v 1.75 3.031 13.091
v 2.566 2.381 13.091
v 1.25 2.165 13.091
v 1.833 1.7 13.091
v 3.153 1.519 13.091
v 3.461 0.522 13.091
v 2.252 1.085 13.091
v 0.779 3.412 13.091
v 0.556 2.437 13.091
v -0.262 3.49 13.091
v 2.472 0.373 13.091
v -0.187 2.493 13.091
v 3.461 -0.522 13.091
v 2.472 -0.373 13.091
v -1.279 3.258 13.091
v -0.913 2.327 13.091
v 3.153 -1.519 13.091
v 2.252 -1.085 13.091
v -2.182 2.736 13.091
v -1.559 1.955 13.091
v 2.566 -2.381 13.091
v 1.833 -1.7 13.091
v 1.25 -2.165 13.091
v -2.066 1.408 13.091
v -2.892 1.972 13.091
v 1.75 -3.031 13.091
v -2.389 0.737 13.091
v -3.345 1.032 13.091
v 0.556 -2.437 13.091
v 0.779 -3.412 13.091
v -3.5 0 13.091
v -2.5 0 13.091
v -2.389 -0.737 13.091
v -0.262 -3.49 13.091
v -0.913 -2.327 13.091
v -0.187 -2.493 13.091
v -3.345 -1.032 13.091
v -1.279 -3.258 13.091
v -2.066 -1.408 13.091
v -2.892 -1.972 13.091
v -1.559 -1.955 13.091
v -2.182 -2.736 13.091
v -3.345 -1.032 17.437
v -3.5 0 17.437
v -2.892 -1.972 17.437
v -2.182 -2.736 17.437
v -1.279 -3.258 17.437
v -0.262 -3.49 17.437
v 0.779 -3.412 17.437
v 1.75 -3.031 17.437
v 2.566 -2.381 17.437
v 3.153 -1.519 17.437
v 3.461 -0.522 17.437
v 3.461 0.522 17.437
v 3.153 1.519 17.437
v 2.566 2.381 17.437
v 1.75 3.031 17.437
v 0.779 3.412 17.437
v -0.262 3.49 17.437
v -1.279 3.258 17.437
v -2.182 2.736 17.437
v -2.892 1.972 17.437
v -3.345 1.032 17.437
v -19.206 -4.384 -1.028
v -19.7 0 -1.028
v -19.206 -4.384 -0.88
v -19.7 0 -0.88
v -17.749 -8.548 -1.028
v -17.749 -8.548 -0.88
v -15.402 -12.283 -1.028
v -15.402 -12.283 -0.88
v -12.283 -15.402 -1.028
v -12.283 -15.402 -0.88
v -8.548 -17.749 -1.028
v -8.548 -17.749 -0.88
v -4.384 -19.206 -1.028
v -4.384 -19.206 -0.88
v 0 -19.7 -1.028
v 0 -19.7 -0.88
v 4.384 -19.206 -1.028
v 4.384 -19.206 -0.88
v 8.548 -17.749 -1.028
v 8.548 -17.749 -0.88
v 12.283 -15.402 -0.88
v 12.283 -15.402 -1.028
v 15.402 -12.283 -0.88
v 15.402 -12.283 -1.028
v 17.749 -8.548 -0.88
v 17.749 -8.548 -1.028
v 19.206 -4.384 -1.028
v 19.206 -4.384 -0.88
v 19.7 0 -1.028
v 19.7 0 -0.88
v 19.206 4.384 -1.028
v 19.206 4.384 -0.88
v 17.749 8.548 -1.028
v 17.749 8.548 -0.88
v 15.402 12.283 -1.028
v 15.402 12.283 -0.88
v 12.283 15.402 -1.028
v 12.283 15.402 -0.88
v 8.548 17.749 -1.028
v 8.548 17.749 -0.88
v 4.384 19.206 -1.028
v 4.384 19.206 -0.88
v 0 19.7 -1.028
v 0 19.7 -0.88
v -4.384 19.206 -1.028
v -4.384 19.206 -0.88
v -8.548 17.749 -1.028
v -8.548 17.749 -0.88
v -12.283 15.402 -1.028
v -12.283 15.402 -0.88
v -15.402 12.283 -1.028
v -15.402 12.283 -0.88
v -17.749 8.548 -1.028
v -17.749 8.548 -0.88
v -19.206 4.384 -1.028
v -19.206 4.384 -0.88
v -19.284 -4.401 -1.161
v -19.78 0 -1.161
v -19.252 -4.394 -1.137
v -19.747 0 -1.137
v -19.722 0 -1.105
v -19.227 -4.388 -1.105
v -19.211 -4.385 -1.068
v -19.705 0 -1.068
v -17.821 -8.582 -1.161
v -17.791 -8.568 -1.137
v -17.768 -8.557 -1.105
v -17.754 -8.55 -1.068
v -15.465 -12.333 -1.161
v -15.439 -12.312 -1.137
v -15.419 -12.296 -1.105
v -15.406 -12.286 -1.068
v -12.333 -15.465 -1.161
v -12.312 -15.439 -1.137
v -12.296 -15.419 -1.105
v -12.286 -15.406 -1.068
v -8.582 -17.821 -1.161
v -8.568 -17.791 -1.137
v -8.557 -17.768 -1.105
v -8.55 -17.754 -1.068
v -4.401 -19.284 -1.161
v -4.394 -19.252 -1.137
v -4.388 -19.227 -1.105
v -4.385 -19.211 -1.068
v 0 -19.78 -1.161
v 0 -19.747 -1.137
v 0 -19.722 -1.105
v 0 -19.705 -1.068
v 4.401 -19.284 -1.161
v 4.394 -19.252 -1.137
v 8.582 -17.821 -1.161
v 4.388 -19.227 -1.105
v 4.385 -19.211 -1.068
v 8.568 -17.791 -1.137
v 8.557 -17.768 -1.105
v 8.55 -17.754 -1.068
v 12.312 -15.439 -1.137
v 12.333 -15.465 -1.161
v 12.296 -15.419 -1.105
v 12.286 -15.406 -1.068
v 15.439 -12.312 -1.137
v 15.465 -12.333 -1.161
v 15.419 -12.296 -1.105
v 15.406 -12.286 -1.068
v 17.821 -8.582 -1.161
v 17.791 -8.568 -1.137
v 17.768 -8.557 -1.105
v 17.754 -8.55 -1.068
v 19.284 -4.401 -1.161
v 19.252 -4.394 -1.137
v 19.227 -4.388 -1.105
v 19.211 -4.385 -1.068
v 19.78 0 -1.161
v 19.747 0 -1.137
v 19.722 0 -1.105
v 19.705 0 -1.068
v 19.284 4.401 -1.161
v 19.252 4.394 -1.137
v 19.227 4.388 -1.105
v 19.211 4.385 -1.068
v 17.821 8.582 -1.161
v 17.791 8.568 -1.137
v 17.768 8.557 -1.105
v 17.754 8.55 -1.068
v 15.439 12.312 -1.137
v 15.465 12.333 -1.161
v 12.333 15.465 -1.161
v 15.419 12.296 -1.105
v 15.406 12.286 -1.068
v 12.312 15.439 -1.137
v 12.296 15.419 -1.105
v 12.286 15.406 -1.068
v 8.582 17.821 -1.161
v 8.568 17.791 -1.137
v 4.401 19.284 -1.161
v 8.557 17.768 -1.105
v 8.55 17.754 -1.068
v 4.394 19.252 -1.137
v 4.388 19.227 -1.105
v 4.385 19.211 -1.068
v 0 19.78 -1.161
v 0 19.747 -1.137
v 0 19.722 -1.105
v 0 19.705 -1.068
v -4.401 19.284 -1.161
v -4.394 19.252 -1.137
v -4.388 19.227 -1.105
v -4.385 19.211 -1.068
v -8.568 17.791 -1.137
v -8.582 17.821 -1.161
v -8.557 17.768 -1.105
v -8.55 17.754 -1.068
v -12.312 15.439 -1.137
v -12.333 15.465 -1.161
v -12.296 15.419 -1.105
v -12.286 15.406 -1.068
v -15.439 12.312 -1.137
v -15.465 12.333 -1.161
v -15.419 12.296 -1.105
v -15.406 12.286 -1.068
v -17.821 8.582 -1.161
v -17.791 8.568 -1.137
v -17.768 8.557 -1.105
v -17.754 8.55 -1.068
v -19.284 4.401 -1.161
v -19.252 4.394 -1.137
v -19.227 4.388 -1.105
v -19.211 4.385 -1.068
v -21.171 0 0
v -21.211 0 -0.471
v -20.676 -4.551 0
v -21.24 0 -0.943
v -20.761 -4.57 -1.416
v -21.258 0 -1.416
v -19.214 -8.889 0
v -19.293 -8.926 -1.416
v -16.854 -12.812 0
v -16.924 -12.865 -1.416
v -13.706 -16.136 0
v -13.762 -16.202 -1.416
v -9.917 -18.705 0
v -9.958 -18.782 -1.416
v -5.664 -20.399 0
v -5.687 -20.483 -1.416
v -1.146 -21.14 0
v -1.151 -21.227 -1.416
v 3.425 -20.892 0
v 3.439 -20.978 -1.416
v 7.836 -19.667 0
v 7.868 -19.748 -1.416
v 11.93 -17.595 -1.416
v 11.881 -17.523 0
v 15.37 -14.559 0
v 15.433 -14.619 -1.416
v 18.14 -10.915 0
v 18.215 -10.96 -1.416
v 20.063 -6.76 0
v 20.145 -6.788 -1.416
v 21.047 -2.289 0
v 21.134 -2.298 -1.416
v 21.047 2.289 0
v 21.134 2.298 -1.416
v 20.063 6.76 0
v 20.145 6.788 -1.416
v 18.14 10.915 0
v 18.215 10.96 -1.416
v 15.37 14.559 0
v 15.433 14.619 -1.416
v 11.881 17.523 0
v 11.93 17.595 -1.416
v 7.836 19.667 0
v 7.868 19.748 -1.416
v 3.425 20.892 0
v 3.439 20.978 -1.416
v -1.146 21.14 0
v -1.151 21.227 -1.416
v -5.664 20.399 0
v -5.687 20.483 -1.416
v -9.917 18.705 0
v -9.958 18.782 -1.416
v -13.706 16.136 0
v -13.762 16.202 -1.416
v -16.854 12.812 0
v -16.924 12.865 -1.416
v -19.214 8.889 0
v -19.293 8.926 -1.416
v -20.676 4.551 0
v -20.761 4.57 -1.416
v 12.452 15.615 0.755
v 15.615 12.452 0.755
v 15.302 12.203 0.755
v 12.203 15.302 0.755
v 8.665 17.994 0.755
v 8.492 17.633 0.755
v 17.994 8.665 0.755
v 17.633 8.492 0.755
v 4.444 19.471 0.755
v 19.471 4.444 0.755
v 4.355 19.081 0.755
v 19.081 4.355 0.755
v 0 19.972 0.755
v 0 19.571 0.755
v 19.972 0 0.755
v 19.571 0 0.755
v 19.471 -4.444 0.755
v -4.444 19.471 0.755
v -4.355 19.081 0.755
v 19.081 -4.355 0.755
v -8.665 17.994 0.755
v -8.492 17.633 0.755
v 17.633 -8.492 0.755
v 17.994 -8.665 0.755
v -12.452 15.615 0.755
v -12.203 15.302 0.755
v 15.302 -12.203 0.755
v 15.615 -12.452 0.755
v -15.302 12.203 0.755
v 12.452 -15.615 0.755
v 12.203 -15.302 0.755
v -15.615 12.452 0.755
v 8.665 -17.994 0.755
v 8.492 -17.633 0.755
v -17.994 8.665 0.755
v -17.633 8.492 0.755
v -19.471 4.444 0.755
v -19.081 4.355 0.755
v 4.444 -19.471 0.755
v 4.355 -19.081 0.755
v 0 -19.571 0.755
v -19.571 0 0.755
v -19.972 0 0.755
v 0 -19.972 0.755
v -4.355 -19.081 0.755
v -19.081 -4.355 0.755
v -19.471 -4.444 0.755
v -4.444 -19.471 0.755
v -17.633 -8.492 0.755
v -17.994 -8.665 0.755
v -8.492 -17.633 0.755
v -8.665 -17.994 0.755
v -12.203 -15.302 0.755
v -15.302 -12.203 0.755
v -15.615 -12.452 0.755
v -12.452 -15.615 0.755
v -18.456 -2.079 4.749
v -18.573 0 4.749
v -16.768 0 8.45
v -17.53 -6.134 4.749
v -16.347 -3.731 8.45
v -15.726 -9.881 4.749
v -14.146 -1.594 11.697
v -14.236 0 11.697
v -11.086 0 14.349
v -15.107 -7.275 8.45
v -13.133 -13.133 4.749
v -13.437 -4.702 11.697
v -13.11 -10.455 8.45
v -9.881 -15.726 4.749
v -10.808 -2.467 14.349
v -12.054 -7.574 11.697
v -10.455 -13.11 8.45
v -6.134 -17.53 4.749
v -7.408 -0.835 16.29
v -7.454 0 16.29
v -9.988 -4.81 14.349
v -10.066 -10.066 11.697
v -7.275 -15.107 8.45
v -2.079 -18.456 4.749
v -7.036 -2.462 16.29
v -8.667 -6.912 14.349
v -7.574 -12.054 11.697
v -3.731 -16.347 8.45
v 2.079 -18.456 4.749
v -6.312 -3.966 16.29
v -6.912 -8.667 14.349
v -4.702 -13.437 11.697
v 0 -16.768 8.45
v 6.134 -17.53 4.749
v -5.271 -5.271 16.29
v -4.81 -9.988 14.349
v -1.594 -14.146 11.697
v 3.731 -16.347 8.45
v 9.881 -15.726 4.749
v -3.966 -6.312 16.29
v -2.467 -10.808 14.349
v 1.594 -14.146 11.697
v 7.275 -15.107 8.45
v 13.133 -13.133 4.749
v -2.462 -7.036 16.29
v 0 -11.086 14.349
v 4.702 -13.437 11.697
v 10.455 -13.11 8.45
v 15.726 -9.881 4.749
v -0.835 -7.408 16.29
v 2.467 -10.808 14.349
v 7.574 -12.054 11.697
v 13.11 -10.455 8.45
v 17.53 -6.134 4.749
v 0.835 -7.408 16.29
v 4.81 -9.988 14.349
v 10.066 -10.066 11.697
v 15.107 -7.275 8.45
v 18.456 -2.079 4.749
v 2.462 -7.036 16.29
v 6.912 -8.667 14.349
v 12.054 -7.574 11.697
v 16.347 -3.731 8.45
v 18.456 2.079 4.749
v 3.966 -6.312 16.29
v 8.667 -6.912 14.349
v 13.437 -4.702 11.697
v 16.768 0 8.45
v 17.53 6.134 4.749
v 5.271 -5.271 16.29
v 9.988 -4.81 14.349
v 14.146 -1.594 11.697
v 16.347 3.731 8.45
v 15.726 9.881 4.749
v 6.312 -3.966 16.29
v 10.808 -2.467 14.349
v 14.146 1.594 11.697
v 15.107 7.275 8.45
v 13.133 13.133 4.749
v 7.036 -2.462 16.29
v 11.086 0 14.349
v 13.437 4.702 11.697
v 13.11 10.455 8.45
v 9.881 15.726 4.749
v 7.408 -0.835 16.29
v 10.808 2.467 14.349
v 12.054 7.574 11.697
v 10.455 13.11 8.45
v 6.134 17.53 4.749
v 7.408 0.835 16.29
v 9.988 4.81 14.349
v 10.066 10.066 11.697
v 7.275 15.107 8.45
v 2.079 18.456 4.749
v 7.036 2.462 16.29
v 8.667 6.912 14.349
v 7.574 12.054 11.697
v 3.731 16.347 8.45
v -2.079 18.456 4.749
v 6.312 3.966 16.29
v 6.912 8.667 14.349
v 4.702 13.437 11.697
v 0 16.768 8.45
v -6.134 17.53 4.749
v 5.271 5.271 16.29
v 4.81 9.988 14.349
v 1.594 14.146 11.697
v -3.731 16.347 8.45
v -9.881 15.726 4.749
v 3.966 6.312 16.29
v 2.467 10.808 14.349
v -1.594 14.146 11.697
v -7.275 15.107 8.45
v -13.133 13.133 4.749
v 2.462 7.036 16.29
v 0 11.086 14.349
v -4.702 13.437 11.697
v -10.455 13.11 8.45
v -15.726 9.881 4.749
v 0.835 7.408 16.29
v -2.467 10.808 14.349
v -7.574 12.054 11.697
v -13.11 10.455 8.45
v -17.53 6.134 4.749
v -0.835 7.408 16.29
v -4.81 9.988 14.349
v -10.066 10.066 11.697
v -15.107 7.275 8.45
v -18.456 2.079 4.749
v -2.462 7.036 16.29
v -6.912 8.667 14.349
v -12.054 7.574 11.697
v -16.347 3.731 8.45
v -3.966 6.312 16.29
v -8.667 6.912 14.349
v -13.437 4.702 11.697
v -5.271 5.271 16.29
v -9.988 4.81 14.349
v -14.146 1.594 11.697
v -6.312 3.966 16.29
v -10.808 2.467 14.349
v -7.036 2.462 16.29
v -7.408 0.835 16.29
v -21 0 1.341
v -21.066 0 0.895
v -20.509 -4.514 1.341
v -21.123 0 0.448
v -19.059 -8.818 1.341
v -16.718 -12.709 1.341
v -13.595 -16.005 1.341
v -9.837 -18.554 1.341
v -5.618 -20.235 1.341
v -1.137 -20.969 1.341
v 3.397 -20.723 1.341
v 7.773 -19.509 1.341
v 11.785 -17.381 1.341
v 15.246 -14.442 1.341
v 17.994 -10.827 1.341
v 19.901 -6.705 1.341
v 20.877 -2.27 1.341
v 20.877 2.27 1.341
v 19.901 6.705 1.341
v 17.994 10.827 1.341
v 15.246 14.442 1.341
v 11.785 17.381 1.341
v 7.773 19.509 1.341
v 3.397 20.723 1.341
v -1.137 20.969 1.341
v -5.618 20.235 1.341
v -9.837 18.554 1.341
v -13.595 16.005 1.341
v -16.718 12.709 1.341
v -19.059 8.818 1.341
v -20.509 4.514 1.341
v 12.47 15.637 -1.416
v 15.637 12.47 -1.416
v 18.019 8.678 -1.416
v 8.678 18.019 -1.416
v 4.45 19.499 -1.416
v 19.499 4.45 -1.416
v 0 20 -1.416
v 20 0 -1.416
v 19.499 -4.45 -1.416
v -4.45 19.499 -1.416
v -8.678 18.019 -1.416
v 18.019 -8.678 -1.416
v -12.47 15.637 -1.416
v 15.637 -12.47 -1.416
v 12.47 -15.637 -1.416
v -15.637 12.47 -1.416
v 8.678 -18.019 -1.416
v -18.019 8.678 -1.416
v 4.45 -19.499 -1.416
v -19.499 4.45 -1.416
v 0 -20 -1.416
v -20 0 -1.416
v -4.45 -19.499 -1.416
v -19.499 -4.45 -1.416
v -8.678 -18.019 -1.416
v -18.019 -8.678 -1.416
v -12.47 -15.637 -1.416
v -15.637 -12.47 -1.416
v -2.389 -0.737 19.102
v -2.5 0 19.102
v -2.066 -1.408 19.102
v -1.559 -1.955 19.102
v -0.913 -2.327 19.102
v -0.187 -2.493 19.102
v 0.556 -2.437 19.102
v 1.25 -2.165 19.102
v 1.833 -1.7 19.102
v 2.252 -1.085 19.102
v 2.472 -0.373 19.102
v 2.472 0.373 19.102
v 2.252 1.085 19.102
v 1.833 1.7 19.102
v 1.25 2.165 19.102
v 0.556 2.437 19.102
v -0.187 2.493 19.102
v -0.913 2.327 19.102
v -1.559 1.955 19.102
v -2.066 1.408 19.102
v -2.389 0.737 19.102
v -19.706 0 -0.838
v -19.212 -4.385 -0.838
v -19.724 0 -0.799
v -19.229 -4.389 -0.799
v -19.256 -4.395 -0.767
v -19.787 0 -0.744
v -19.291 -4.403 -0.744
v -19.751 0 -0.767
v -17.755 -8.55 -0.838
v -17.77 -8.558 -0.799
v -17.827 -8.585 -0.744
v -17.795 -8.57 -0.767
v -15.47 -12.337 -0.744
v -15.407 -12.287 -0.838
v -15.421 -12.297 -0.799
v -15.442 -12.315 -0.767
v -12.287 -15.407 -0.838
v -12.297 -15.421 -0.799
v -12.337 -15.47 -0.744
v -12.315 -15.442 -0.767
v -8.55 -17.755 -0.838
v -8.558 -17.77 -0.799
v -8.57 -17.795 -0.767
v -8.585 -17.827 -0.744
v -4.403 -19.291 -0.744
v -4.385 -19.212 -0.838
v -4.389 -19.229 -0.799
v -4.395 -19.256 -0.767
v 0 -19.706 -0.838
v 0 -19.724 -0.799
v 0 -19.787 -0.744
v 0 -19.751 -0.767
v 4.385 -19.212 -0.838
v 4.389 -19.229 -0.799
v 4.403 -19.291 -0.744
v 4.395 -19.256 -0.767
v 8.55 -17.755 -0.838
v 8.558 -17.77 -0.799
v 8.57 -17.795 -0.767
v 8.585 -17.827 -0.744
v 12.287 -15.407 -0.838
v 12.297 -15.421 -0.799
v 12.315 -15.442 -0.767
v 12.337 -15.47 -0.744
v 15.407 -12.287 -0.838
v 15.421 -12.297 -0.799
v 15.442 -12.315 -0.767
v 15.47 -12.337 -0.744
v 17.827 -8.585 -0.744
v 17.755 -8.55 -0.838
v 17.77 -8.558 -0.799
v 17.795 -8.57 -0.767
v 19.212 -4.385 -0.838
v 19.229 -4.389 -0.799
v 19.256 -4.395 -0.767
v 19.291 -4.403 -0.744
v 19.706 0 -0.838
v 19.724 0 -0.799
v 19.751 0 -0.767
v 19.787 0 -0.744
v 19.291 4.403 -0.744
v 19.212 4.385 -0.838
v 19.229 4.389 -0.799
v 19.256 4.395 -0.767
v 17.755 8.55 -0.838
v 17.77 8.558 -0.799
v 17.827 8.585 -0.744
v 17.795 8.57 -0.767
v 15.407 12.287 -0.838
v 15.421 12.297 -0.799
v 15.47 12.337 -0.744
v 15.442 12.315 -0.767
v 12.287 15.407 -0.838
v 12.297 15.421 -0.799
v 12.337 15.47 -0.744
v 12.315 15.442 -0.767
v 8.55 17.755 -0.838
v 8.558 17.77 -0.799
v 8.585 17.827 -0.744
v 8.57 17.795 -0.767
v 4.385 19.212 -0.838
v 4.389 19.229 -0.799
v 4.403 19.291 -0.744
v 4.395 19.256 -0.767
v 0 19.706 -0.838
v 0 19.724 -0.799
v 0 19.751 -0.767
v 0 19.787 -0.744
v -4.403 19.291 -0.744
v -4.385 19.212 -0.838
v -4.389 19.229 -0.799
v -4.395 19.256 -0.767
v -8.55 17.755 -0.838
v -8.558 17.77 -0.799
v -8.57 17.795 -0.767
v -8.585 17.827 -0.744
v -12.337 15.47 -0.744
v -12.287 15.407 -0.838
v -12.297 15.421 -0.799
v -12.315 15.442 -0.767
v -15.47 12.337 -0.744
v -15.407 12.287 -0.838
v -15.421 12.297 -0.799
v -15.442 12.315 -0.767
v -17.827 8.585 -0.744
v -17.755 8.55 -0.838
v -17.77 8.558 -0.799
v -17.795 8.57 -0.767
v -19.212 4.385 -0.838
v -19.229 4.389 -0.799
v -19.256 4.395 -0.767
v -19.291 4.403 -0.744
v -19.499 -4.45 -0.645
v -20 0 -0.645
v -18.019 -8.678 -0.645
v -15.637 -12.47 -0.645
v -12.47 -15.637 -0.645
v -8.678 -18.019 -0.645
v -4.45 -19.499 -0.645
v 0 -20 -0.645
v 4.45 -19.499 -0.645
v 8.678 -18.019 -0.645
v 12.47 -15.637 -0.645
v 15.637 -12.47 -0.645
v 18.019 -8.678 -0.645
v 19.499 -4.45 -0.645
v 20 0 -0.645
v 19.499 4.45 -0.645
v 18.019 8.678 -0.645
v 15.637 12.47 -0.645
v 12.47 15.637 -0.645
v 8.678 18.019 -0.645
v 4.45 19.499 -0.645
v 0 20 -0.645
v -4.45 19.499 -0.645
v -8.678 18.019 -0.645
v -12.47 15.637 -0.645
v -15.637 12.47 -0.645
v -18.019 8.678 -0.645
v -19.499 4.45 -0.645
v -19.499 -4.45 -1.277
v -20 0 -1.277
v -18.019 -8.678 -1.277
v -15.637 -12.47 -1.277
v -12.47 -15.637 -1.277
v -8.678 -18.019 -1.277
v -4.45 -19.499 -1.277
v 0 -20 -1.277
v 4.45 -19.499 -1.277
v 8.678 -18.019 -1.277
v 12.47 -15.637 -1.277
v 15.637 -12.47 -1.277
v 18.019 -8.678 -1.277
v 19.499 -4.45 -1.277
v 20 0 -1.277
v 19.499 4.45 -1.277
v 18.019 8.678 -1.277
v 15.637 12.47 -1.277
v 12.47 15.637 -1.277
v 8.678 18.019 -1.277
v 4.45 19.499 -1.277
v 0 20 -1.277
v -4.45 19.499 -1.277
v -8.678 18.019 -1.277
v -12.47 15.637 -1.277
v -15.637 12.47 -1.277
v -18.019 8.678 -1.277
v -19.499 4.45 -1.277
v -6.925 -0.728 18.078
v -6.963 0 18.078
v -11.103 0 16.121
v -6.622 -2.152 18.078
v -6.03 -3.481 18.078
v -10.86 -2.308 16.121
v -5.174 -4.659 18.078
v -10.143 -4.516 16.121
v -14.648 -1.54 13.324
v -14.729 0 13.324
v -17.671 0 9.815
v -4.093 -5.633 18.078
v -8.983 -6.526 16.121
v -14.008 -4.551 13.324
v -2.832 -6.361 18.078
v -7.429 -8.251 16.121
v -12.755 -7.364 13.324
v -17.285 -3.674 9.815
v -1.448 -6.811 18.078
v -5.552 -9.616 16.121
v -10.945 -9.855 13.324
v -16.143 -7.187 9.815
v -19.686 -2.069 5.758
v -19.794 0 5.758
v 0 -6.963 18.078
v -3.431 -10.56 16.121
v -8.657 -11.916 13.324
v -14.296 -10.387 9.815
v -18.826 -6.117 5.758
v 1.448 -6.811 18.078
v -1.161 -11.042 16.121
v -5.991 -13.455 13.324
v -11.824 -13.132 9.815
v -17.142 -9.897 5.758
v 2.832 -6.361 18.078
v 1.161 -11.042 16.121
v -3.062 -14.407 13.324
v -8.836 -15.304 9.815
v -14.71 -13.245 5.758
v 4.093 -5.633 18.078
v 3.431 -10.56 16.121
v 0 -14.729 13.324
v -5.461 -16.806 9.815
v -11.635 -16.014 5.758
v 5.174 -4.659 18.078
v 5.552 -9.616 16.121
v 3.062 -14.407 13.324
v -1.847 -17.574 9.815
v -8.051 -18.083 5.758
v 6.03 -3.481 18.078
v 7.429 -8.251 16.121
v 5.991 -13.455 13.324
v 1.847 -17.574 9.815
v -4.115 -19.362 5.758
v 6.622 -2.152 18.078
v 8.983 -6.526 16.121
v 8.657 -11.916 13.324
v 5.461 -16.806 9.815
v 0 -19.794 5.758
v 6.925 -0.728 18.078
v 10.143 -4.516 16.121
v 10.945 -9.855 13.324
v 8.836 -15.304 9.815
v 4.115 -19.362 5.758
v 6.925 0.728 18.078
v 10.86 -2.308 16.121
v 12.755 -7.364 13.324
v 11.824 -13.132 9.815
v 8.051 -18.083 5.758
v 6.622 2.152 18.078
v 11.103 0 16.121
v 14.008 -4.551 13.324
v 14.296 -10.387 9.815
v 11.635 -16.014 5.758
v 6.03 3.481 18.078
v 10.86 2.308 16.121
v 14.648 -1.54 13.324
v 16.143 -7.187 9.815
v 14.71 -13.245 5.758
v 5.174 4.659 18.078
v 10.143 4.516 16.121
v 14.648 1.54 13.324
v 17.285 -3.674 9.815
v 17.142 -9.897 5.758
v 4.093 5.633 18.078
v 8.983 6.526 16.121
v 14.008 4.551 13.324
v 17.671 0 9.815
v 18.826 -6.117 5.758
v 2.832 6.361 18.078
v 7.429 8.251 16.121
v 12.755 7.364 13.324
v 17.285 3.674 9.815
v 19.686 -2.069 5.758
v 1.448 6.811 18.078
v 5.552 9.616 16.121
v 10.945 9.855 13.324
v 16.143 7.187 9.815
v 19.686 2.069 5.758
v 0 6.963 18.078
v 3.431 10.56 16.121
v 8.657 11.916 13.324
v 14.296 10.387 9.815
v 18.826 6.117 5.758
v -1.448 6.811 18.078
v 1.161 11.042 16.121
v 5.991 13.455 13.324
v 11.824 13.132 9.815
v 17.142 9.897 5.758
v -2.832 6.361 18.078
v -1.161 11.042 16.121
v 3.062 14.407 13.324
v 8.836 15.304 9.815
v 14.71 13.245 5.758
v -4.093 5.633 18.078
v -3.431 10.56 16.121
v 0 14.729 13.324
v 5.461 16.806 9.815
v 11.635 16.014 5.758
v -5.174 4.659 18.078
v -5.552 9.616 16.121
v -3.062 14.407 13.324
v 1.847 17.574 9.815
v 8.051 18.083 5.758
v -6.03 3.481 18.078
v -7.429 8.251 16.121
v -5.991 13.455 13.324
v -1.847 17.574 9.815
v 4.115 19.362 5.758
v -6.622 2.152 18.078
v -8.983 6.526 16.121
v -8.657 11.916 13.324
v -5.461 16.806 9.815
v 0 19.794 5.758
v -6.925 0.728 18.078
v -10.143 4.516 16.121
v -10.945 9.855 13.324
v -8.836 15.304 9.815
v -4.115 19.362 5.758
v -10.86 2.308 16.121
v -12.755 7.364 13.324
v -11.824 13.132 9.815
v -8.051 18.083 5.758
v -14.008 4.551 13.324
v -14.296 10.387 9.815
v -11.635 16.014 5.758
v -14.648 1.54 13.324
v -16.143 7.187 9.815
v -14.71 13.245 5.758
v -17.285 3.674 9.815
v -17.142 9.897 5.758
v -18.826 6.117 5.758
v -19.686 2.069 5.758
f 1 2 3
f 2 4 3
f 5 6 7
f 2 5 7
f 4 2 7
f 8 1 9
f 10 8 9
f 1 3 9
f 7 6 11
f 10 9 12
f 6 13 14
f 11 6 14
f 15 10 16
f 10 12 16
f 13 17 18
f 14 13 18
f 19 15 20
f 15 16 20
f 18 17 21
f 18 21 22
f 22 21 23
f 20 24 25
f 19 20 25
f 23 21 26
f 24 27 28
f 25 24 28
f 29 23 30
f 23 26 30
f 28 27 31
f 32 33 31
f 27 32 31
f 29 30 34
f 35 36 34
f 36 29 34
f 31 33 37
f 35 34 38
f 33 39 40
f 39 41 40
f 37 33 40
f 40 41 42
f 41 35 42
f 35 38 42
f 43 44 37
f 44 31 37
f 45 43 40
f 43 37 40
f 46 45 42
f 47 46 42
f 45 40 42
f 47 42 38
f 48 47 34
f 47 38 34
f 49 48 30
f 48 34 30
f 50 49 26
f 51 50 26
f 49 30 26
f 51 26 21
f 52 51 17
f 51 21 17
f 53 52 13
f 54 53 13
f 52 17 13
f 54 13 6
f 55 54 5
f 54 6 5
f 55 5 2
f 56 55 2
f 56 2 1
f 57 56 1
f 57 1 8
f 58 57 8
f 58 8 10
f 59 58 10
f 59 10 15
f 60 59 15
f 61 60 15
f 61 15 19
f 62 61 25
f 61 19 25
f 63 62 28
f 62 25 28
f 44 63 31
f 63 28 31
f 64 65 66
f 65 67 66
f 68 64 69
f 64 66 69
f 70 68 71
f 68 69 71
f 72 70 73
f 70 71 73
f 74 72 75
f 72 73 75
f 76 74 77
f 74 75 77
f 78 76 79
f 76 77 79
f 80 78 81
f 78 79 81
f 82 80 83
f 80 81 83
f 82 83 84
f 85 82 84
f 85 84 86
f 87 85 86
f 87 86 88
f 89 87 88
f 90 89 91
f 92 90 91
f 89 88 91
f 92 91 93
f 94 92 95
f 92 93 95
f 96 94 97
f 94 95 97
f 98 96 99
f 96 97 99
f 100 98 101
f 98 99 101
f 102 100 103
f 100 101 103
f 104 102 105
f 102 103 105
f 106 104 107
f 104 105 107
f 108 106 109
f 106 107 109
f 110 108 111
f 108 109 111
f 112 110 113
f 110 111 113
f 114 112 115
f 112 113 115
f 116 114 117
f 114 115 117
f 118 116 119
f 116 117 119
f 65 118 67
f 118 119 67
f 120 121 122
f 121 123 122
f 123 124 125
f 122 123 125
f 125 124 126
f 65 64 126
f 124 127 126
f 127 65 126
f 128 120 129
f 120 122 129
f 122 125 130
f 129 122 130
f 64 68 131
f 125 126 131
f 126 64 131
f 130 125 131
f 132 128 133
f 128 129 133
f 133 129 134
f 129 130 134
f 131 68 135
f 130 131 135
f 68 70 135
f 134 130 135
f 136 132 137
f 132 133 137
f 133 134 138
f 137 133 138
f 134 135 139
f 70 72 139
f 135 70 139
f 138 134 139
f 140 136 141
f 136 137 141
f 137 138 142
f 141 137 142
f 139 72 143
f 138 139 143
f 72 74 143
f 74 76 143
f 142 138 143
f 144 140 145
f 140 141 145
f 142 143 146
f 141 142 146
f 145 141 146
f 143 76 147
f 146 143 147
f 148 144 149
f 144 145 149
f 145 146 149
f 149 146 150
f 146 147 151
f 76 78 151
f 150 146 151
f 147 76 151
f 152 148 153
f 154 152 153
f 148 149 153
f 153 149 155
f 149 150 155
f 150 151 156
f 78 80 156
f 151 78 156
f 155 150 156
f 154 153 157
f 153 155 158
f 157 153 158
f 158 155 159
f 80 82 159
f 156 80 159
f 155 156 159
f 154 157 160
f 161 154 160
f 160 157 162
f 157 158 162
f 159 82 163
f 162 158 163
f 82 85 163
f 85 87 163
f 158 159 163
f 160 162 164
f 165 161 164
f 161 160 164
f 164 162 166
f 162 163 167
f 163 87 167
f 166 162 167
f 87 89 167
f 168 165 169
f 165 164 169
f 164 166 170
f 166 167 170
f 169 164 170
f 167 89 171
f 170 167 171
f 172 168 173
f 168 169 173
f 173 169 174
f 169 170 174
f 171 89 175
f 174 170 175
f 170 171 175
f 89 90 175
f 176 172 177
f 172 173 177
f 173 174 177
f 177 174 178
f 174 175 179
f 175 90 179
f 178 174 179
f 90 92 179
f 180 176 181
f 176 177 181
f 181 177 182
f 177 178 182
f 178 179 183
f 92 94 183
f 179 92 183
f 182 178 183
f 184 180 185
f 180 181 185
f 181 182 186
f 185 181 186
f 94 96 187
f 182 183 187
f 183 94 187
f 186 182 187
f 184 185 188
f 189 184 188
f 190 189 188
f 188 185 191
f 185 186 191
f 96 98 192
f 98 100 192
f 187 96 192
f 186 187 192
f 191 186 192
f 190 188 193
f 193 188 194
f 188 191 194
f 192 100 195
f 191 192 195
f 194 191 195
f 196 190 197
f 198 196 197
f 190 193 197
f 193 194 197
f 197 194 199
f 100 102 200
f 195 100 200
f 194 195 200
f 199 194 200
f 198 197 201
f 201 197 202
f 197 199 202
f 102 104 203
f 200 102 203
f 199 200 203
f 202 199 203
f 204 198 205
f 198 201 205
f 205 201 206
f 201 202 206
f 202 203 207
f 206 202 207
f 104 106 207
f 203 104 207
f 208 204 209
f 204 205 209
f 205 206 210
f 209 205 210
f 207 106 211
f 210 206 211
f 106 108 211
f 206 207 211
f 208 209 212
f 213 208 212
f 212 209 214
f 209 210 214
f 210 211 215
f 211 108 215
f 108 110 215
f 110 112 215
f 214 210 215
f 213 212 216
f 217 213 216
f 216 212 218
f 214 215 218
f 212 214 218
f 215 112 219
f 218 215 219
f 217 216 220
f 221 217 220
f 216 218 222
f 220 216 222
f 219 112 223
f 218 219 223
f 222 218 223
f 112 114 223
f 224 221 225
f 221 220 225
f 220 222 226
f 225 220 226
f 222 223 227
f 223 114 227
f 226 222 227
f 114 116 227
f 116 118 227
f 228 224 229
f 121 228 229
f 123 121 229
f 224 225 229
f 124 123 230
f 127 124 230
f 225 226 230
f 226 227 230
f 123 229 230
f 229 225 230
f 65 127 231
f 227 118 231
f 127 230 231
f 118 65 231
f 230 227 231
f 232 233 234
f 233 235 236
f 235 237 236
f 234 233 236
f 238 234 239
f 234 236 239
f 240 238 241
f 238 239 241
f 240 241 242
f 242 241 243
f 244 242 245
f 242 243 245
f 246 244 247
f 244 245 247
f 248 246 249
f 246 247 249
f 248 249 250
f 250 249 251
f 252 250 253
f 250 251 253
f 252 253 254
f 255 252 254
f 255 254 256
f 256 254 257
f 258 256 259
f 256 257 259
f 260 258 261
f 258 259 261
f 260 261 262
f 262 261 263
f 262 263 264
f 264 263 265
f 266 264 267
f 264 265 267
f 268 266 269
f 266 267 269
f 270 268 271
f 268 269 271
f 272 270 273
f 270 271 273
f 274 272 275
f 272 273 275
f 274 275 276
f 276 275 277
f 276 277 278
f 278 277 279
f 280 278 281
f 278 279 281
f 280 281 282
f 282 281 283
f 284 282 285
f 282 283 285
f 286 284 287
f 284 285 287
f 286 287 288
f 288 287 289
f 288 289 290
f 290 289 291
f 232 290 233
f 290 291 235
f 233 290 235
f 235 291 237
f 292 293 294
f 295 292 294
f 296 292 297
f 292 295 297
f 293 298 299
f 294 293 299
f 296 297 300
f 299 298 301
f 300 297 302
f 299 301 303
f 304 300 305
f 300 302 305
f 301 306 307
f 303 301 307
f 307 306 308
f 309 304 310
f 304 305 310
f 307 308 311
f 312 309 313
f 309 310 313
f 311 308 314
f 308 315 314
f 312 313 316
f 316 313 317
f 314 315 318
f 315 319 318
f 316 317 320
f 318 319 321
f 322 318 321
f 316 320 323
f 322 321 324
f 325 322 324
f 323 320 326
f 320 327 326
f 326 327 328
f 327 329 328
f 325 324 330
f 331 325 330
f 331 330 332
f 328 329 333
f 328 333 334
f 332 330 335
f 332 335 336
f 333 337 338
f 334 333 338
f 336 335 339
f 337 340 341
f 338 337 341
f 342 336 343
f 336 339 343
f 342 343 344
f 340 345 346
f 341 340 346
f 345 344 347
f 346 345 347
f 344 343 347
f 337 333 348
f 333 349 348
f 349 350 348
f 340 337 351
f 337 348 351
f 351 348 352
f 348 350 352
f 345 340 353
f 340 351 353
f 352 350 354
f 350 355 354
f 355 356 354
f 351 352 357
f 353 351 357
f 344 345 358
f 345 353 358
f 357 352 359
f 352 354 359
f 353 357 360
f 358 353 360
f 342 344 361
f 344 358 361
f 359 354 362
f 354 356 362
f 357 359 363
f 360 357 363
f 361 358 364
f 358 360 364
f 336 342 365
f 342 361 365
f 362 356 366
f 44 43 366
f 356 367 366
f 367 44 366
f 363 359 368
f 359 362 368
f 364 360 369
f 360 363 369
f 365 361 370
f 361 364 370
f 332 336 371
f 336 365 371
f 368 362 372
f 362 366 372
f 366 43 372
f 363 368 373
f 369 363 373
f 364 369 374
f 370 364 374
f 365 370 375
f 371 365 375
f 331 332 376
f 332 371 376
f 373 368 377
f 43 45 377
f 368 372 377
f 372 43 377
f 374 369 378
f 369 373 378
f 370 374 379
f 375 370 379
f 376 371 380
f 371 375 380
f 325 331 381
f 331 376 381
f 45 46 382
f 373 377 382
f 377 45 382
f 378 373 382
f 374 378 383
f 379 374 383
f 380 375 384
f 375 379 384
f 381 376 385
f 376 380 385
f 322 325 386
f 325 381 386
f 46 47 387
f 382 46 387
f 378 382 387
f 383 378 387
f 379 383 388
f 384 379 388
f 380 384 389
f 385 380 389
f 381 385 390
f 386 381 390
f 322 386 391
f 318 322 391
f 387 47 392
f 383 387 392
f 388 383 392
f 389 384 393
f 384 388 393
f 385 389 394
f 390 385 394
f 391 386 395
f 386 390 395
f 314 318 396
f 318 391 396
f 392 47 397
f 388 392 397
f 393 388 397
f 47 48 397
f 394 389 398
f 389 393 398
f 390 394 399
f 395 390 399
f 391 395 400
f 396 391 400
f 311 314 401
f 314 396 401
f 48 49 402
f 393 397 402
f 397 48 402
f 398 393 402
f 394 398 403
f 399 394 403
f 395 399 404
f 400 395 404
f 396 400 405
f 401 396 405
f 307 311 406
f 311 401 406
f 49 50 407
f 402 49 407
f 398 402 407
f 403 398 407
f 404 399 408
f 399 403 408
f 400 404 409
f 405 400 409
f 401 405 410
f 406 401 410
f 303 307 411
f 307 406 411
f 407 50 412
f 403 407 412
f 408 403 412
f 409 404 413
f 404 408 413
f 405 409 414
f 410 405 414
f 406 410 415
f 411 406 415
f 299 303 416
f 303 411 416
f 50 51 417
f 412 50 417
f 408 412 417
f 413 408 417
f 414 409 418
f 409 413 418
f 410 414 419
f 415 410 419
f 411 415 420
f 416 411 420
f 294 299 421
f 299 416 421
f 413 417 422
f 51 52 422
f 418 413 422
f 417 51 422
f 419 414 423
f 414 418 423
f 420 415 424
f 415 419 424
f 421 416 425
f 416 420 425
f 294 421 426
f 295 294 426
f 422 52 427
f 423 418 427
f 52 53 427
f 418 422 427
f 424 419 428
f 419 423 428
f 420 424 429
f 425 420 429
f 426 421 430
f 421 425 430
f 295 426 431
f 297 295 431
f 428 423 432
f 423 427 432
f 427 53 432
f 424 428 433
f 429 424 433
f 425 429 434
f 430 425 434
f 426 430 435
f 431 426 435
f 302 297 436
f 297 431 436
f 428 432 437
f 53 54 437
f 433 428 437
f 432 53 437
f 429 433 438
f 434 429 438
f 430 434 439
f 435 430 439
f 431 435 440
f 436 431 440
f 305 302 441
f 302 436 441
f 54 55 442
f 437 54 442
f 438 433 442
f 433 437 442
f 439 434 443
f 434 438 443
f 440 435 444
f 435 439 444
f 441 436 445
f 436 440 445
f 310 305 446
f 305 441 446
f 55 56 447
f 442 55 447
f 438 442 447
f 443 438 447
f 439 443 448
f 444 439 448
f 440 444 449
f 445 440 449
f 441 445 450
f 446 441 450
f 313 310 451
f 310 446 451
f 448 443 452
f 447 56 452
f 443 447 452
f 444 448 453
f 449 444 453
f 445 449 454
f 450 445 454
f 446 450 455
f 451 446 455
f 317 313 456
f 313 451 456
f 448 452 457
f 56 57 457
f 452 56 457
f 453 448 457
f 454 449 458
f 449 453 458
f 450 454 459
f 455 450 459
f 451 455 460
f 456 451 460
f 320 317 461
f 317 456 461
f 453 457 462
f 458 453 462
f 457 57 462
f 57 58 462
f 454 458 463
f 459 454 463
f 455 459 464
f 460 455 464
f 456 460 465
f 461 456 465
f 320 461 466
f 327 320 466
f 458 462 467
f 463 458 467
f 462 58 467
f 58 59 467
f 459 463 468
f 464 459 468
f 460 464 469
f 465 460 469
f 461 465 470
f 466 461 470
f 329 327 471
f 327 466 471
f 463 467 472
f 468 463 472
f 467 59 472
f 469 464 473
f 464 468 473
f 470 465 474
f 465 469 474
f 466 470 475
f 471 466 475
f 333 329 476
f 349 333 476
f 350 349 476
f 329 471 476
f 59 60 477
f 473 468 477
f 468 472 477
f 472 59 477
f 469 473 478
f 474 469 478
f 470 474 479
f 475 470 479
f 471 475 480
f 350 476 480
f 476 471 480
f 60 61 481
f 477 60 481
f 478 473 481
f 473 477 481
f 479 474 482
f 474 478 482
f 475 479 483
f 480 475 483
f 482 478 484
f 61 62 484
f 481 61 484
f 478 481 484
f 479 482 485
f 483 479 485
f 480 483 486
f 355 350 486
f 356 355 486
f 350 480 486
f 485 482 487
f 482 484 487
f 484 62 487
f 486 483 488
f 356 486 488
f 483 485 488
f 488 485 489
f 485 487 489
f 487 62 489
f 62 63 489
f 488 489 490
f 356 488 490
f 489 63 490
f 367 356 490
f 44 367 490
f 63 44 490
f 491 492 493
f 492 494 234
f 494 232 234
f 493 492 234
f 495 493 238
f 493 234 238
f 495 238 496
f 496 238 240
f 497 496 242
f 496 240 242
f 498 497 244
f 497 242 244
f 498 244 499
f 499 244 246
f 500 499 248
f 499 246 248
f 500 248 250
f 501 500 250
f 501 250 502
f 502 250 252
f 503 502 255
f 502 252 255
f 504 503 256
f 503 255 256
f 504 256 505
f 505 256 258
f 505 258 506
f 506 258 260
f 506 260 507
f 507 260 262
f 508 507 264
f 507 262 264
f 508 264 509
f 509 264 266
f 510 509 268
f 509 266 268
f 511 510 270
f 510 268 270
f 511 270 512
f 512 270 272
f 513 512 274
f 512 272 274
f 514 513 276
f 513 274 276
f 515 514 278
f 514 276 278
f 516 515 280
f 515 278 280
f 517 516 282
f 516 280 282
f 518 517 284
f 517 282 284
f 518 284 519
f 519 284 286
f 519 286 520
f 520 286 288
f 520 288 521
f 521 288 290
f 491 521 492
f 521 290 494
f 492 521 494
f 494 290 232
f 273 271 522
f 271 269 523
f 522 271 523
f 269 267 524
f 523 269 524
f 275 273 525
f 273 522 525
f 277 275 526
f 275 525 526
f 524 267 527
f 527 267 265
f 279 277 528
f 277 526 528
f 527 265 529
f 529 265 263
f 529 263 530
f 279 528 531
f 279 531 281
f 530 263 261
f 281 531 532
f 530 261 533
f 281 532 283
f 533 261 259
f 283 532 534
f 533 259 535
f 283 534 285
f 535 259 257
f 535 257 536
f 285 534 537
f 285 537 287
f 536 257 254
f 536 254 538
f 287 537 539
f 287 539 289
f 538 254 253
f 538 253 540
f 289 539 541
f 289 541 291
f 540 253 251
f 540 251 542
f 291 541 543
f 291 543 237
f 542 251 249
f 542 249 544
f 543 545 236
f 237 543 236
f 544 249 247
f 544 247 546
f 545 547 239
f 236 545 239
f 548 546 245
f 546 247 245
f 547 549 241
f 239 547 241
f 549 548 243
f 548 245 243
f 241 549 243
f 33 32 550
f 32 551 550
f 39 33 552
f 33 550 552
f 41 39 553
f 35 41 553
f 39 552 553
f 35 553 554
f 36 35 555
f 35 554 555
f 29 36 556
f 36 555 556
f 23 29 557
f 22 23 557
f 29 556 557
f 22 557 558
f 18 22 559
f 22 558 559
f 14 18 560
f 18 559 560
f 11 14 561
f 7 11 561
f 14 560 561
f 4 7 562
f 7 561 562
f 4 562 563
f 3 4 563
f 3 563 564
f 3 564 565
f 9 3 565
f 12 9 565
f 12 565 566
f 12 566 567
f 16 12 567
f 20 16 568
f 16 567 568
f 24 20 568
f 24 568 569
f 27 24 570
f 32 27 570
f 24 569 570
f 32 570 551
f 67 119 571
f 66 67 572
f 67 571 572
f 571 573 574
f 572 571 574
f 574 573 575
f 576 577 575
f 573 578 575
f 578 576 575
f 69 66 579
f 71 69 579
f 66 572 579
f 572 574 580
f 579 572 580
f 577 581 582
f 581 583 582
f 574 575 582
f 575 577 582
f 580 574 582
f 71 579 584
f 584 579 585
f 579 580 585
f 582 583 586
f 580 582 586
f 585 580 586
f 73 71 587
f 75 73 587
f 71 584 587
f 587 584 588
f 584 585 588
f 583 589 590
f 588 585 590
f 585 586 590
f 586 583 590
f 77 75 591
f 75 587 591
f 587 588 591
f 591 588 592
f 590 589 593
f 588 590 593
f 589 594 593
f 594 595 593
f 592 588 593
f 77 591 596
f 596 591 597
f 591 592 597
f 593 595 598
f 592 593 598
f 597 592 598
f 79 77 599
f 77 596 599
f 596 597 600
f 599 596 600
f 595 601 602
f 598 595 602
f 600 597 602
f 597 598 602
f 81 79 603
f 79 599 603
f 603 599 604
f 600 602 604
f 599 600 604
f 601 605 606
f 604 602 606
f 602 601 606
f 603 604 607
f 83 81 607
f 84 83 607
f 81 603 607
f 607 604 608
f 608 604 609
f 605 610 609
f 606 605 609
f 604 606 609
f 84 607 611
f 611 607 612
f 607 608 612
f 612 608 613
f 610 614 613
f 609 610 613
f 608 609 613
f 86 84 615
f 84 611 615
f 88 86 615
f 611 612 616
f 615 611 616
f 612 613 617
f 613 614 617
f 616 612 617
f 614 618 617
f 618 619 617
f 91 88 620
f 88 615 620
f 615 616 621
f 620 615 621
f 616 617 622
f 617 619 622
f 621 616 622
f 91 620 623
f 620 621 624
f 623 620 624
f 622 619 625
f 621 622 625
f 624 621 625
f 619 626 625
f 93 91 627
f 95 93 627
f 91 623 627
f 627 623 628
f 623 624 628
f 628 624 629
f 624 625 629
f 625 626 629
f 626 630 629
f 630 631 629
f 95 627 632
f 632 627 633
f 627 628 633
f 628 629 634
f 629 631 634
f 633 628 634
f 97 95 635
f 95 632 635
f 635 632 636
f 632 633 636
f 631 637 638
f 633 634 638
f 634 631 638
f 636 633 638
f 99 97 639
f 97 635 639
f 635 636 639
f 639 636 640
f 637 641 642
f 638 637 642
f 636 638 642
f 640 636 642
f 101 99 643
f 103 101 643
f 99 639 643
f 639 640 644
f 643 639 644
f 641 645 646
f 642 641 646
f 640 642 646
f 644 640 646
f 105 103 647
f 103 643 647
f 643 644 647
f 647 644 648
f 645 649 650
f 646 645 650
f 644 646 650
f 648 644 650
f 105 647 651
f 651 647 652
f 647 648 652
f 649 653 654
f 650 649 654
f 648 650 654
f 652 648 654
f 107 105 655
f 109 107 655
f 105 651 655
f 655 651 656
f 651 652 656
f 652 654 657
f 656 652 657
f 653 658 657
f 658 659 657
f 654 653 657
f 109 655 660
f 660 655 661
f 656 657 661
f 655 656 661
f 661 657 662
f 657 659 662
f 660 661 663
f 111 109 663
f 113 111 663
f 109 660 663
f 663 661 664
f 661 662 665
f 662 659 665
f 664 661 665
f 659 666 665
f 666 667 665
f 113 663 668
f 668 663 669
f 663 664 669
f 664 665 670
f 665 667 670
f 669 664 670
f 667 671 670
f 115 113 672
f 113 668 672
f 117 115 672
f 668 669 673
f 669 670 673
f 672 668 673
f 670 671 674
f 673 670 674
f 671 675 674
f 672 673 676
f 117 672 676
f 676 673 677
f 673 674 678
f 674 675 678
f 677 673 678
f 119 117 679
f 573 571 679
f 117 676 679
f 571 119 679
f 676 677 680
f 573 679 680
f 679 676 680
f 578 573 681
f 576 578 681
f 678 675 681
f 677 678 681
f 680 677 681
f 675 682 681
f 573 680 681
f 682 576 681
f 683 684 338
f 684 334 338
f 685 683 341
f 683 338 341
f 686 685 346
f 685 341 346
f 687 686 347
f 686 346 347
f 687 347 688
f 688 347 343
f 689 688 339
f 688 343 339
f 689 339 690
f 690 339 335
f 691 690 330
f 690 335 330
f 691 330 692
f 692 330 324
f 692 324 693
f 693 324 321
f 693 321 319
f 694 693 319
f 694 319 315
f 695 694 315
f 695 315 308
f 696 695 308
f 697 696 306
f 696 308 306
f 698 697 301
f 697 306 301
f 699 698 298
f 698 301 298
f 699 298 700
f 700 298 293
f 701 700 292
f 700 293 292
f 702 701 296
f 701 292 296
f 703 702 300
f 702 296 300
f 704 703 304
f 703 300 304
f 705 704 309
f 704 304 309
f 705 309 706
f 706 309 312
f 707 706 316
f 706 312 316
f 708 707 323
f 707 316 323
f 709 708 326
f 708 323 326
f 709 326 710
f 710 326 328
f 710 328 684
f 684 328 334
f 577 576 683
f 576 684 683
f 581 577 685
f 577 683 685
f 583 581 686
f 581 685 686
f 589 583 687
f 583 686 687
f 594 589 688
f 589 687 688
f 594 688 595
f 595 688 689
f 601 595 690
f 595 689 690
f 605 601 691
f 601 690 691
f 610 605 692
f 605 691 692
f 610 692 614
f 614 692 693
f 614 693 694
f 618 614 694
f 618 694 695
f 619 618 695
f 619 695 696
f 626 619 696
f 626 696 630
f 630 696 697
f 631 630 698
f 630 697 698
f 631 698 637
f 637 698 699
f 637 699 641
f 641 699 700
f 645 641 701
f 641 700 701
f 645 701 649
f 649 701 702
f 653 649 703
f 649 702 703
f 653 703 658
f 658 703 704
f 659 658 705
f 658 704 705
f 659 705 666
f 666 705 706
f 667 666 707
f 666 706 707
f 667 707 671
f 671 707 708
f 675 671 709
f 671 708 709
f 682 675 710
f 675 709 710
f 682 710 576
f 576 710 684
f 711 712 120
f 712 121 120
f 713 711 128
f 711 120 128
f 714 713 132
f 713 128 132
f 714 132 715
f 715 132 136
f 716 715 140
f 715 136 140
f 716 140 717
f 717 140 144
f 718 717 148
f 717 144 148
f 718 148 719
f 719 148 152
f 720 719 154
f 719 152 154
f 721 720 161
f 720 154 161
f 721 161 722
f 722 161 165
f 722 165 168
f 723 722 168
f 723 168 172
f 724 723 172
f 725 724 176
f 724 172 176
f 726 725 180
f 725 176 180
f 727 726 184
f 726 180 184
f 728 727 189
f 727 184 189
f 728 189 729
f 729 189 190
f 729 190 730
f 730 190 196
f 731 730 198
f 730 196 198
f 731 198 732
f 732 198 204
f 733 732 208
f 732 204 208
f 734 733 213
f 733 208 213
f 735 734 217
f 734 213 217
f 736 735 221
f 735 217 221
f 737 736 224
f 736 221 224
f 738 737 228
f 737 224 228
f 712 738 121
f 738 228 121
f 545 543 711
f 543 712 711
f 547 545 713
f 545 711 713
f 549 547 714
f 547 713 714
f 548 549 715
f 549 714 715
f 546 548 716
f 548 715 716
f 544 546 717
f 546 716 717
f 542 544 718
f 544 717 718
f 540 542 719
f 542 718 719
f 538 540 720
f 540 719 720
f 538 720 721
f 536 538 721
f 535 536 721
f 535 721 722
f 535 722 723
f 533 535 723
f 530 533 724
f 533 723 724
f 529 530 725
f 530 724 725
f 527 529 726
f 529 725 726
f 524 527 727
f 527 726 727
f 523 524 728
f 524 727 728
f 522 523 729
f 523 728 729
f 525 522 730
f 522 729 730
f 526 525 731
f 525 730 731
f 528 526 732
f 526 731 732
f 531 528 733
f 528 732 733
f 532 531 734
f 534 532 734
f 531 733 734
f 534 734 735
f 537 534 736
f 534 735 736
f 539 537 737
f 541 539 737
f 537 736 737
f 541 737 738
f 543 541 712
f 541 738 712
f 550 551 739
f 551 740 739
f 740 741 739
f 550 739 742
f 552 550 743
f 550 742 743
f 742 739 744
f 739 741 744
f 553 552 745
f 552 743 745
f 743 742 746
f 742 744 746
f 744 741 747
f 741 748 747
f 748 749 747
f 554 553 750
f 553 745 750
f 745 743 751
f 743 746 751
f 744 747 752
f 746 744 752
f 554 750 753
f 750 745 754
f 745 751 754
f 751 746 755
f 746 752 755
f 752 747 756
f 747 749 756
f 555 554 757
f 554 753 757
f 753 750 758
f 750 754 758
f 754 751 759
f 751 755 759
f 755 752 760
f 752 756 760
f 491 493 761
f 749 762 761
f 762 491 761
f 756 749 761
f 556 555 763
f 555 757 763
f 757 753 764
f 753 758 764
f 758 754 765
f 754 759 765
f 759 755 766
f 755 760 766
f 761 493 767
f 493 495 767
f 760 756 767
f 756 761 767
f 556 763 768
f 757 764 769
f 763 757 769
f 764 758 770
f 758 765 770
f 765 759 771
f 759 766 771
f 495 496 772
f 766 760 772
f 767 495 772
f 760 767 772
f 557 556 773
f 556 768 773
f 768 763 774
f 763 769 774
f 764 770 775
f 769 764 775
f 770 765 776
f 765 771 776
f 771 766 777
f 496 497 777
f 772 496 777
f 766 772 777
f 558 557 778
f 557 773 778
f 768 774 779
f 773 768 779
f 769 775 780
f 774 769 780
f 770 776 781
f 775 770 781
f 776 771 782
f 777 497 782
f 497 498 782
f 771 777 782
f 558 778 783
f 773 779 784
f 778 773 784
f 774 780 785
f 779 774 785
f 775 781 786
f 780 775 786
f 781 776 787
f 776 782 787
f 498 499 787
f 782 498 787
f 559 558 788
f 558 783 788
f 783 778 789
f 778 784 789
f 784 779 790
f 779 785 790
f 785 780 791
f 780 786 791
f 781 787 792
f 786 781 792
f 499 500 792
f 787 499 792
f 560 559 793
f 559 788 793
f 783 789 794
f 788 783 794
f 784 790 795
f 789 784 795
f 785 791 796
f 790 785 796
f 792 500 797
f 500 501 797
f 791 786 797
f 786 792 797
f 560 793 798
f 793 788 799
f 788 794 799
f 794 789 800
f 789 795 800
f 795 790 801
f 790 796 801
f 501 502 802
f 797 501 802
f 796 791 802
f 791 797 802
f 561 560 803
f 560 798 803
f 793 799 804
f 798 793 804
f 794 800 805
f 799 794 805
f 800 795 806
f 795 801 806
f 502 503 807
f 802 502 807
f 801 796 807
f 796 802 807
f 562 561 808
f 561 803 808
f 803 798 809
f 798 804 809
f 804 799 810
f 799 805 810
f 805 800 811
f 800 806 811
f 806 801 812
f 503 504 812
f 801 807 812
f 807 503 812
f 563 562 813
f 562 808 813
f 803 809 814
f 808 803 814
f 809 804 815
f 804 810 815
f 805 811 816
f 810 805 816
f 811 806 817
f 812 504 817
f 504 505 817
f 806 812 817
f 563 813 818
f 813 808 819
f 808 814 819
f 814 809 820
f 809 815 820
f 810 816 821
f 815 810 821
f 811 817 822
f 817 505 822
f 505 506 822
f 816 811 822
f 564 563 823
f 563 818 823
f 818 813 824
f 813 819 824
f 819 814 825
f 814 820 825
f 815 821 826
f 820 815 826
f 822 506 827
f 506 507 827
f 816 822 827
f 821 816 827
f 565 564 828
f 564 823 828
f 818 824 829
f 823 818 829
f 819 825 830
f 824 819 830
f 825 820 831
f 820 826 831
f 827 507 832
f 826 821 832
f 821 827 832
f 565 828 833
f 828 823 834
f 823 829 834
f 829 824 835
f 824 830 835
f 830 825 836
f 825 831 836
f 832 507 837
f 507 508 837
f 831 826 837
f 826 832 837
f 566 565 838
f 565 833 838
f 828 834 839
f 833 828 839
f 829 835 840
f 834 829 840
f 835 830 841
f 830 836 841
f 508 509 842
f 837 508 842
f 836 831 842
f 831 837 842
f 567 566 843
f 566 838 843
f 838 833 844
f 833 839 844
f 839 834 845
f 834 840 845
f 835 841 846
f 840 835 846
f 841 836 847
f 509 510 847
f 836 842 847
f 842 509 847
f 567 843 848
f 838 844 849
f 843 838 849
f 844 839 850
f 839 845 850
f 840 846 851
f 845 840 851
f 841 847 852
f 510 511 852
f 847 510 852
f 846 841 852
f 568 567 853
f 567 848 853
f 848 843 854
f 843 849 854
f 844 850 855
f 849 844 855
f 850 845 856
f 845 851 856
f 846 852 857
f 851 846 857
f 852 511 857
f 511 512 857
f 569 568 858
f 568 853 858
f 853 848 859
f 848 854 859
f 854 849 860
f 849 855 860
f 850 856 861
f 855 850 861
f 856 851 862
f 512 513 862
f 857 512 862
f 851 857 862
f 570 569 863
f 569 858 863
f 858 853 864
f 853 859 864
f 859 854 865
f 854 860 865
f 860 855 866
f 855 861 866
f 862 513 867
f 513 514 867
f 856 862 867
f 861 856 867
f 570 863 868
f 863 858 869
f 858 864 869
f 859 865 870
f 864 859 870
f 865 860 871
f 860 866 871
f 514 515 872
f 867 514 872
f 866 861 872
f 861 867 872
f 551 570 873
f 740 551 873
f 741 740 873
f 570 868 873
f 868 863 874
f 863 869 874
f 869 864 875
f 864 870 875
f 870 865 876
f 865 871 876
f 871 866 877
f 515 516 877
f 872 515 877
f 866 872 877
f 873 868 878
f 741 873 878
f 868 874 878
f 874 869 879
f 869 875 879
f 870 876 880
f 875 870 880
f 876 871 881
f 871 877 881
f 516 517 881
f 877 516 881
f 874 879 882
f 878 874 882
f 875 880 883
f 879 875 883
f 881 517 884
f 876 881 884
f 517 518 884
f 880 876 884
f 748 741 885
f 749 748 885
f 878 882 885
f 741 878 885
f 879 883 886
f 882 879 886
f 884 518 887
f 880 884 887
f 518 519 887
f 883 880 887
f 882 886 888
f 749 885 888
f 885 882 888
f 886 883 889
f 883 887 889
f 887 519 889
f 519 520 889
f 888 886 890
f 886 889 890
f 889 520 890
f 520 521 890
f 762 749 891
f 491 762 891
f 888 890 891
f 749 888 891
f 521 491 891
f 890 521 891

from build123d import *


with BuildPart() as f1:
    # F0 (on Front) → F1 (revolve)
    with BuildSketch(Plane.XZ):
        with BuildLine():
            ThreePointArc((-2.5, 19.1022348606), (-14.7285015996, 13.3239396782), (-21, 1.3408993961))
            Line((-21, 1.3408993961), (-21, 0))
            Line((-21, 0), (-21, -1.4155078679))
            Line((-21, -1.4155078679), (-20, -1.4155078679))
            Line((-20, -1.4155078679), (-20, -1.276968047))
            Line((-20, -1.276968047), (-19.7798779008, -1.1605625712))
            ThreePointArc((-19.7798779008, -1.1605625712), (-19.7215120339, -1.1053626098), (-19.7, -1.0279620765))
            Line((-19.7, -1.0279620765), (-19.7, -0.8797861519))
            ThreePointArc((-19.7, -0.8797861519), (-19.7236004385, -0.7990201266), (-19.7869753447, -0.7436689494))
            Line((-19.7869753447, -0.7436689494), (-20, -0.6450347927))
            Line((-20, -0.6450347927), (-19.9719204218, 0.7546835851))
            Line((-19.9719204218, 0.7546835851), (-19.5714847863, 0.7546835851))
            ThreePointArc((-19.5714847863, 0.7546835851), (-14.2355631855, 11.6969304474), (-3.5, 17.4373580286))
            Line((-3.5, 17.4373580286), (-3.5, 17.5909579977))
            Line((-3.5, 17.5909579977), (-2.5, 17.5909579977))
            Line((-2.5, 17.5909579977), (-2.5, 19.1022348606))
        make_face()
        with BuildLine():
            Line((-21, 0), (-21, 1.3408993961))
            ThreePointArc((-21, 1.3408993961), (-21.096111691, 0.6718079569), (-21.1709106225, 0))
            Line((-21.1709106225, 0), (-21, 0))
        make_face()
        with BuildLine():
            Line((-21, -1.4155078679), (-21, 0))
            Line((-21, 0), (-21.1709106225, 0))
            ThreePointArc((-21.1709106225, 0), (-21.2263950777, -0.7070254877), (-21.2582742561, -1.4155078679))
            Line((-21.2582742561, -1.4155078679), (-21, -1.4155078679))
        make_face()
        with BuildLine():
            ThreePointArc((-3.5, 17.4373580286), (-3.0009828786, 17.5205569636), (-2.5, 17.5909579977))
            Line((-2.5, 17.5909579977), (-3.5, 17.5909579977))
            Line((-3.5, 17.5909579977), (-3.5, 17.4373580286))
        make_face()
        with BuildLine():
            Line((-2.5, 14.7757632658), (-2.5, 17.5909579977))
            ThreePointArc((-2.5, 17.5909579977), (-3.0009828786, 17.5205569636), (-3.5, 17.4373580286))
            Line((-3.5, 17.4373580286), (-3.5, 13.0909579977))
            Line((-3.5, 13.0909579977), (-2.5, 13.0909579977))
            Line((-2.5, 13.0909579977), (-2.5, 14.7757632658))
        make_face()
    revolve(axis=Axis((0, 0, 4.2133438401), (0, 0, 1)))


solid = f1.part
